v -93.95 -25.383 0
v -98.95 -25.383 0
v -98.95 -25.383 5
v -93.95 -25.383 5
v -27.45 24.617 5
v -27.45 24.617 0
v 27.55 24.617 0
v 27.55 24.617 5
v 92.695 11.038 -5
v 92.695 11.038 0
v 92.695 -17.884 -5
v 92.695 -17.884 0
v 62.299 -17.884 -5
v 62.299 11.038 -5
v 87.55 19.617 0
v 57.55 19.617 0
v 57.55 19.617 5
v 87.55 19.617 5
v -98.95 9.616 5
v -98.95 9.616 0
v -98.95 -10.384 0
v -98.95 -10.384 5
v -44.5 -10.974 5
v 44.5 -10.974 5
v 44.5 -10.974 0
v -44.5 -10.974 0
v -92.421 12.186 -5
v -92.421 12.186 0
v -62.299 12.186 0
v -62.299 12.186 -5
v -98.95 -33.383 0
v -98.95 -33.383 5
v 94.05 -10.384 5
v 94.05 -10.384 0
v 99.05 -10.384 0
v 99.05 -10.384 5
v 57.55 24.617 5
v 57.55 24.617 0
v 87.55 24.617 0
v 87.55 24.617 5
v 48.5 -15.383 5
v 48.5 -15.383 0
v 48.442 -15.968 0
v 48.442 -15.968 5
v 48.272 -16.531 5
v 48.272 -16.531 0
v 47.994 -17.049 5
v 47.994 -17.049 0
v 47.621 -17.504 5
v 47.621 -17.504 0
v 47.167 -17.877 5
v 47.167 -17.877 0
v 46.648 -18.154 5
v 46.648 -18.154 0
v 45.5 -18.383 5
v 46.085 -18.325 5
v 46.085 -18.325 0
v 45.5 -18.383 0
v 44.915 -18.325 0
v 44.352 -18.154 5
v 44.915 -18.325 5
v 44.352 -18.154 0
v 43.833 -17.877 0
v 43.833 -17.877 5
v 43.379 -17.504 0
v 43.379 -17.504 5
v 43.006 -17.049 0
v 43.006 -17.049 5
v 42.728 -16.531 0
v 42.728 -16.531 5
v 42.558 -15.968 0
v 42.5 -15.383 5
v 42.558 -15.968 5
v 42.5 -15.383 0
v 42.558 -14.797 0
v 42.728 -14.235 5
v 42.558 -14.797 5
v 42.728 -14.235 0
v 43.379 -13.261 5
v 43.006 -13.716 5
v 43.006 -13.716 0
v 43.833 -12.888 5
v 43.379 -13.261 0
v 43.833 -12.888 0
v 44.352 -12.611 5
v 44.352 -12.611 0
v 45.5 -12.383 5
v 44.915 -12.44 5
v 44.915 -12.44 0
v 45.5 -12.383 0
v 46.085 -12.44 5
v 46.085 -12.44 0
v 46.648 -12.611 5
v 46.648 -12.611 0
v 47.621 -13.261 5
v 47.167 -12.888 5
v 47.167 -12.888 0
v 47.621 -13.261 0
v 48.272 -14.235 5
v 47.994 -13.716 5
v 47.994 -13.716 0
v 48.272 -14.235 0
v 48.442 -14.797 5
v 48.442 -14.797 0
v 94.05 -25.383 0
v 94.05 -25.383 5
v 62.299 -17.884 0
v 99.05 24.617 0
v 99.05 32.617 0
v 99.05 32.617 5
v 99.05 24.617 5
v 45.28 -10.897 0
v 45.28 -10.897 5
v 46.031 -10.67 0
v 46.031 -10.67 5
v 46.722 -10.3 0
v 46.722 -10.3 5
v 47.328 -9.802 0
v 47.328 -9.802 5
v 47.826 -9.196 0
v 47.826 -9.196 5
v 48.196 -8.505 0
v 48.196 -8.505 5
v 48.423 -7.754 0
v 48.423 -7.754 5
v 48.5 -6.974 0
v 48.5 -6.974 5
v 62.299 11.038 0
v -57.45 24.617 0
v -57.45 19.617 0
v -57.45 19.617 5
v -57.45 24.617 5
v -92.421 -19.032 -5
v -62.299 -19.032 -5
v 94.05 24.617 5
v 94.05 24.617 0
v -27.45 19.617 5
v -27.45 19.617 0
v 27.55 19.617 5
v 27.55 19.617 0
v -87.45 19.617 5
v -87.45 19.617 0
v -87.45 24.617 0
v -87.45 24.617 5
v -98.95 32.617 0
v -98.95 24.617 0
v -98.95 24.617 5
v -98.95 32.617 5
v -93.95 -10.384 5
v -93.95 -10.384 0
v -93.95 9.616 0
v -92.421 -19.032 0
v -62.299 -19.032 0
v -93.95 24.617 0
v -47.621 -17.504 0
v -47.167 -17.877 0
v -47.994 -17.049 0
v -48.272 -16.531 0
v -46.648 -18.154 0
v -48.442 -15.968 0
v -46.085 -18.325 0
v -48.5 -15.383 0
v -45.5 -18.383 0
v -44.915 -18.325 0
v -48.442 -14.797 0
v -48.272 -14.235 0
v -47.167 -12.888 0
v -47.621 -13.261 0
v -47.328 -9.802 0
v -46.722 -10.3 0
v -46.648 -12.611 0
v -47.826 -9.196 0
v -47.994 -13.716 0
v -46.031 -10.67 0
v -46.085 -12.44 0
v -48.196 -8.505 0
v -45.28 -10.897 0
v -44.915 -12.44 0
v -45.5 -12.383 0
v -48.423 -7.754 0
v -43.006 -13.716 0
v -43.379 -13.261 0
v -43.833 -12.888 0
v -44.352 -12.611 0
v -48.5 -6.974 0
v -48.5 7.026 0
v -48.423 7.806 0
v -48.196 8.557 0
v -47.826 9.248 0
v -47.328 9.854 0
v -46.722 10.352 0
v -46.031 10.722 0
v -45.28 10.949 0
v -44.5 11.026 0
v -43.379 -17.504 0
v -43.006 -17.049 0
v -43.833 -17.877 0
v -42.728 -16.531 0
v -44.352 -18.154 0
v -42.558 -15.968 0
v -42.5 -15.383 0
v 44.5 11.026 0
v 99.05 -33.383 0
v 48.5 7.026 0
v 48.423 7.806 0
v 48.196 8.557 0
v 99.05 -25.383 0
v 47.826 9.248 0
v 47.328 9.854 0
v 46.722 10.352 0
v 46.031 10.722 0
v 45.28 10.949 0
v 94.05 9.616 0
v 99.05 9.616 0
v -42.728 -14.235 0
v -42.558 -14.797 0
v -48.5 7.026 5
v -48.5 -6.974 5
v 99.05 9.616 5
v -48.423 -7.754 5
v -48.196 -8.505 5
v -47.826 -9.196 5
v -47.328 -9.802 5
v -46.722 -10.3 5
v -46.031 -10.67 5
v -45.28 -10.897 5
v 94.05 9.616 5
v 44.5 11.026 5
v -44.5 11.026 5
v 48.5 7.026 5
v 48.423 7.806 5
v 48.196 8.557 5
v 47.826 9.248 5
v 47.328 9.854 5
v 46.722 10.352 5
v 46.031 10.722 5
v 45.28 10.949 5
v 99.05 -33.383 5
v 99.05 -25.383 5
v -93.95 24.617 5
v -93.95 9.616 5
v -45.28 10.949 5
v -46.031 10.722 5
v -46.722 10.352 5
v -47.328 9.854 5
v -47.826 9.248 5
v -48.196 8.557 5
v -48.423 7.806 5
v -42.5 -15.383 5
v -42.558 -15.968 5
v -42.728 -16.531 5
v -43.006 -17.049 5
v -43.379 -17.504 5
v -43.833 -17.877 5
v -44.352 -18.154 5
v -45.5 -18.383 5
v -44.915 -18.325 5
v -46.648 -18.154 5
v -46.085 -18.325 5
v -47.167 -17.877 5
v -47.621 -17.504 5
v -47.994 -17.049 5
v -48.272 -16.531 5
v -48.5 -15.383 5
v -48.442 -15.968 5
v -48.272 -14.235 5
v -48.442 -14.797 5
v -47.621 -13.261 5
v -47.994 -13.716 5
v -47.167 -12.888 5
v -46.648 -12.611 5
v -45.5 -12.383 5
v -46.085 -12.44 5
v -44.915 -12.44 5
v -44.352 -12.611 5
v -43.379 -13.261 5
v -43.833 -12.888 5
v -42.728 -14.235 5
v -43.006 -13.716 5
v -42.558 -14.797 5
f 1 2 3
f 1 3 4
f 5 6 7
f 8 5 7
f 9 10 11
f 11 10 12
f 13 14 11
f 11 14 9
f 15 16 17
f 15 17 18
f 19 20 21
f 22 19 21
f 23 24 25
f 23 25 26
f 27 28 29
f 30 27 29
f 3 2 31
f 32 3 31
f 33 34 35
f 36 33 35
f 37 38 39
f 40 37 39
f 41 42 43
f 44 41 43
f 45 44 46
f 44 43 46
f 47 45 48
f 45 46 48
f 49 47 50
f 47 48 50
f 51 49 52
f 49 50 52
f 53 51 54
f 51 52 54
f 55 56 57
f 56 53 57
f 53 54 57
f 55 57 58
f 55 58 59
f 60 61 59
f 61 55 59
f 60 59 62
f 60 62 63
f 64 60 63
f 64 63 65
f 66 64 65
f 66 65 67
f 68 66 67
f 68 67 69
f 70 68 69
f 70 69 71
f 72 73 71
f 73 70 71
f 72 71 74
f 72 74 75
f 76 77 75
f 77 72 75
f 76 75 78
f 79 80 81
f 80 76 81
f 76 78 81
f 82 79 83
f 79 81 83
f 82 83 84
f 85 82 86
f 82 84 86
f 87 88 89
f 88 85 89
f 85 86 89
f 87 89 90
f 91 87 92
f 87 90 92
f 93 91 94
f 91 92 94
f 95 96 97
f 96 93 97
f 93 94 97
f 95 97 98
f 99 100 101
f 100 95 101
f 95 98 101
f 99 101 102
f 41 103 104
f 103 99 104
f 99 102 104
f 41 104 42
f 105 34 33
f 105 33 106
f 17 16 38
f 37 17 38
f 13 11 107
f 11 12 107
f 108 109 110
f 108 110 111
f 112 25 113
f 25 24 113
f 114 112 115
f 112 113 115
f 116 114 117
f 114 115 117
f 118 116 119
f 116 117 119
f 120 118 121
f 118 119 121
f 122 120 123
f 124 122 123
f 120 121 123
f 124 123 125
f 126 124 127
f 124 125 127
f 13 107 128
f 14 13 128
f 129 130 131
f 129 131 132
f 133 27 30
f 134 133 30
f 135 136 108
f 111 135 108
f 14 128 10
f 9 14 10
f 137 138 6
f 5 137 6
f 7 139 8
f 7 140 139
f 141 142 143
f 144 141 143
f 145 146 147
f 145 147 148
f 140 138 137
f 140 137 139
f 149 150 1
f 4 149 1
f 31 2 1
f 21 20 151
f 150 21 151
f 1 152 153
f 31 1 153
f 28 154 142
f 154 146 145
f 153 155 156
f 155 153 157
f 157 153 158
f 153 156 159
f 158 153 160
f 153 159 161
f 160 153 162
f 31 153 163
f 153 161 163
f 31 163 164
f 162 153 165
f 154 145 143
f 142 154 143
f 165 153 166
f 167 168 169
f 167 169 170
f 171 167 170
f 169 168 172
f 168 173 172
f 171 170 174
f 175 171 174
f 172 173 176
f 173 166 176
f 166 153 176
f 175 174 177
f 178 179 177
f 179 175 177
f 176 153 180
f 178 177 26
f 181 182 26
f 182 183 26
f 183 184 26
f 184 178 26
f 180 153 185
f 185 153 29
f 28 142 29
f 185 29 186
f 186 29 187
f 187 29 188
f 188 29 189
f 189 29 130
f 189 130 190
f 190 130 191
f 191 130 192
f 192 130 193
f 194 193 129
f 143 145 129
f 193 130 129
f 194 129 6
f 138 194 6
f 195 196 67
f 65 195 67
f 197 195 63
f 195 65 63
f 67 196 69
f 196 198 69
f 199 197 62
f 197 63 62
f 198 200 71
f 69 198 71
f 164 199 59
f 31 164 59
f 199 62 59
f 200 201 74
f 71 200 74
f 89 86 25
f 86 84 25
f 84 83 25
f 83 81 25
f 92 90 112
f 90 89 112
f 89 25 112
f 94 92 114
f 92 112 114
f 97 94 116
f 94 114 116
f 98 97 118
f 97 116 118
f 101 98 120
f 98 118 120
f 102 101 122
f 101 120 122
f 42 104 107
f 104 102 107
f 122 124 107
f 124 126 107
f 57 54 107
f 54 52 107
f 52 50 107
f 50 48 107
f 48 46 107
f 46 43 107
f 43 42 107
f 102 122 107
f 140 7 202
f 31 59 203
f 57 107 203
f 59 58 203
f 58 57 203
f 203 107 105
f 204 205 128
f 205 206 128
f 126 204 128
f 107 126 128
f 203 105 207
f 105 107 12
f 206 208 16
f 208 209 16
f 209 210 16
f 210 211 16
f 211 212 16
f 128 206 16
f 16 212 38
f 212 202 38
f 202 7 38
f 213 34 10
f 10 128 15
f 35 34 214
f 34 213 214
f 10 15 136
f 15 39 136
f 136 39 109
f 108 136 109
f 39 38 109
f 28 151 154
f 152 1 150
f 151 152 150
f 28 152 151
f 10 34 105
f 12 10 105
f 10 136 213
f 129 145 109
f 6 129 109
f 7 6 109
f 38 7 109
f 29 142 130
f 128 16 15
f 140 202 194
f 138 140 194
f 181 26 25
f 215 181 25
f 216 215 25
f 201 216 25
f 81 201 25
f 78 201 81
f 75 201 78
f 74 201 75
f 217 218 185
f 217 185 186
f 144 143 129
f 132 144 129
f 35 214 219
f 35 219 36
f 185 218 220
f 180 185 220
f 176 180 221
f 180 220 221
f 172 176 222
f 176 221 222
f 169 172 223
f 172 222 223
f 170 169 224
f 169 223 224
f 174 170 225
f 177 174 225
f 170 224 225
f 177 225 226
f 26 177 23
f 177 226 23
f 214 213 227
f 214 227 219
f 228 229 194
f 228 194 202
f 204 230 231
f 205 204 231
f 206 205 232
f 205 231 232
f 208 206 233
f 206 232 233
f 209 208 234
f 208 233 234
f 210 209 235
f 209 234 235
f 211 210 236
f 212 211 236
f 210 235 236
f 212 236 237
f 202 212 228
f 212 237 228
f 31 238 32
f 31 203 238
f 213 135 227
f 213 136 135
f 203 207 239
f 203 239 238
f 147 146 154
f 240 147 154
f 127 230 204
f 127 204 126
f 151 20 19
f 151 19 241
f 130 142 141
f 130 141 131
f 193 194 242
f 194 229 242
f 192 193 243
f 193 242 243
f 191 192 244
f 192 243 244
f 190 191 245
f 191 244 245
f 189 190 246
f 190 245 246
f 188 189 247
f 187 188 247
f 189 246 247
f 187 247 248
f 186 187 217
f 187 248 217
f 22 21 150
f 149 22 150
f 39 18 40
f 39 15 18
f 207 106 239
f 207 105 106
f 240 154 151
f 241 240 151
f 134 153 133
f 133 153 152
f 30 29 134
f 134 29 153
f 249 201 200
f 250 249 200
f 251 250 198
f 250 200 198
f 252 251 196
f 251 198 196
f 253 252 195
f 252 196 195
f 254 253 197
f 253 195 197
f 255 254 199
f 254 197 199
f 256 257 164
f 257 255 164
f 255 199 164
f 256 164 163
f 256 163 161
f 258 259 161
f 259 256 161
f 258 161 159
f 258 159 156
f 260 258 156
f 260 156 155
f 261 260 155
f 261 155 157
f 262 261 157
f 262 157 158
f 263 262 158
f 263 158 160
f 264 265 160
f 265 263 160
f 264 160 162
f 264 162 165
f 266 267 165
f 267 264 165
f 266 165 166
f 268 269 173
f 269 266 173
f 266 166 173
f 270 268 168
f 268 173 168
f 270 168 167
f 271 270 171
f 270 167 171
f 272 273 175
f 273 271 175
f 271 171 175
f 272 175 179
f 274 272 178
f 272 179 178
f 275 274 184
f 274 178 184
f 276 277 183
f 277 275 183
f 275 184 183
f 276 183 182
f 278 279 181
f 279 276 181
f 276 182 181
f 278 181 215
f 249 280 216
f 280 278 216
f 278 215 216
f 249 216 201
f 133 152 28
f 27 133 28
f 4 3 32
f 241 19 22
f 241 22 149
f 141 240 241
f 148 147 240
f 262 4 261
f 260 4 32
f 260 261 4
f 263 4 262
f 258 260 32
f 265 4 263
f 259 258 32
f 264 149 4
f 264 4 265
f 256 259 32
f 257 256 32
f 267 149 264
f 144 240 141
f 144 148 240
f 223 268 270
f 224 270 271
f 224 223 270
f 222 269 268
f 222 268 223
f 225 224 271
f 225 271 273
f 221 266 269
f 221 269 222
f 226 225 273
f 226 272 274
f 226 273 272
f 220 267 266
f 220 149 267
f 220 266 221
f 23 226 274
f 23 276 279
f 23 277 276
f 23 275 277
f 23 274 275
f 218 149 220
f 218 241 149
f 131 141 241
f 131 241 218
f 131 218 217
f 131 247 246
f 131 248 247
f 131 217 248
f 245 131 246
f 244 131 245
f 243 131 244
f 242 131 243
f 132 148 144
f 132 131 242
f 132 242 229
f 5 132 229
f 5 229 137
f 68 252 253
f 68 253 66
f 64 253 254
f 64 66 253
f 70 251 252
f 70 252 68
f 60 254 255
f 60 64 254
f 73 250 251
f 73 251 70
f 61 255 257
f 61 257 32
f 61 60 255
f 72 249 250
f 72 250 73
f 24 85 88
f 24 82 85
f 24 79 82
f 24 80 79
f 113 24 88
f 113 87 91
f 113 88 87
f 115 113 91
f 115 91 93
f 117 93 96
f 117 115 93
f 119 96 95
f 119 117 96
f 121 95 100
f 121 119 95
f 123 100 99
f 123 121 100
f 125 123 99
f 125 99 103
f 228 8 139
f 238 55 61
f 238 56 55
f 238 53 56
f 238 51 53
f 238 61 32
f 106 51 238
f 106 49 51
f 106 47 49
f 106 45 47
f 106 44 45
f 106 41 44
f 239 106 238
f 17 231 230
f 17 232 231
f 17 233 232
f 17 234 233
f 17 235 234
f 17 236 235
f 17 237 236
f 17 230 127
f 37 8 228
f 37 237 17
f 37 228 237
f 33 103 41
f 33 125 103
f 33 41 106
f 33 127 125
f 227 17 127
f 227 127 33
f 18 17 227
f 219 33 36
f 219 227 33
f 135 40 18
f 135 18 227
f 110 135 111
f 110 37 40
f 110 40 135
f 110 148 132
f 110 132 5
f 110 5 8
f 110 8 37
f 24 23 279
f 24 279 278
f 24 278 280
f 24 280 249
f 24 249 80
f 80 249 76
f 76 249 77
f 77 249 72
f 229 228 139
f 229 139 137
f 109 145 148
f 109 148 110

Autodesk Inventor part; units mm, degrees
ref_plane "YZ Plane" through (0, 0, 0) normal (1, 0, 0) x (0, 1, 0)
ref_plane "XZ Plane" through (0, 0, 0) normal (0, 1, 0) x (-1, 0, 0)
ref_plane "XY Plane" through (0, 0, 0) normal (0, 0, 1) x (1, 0, 0)
sketch "Sketch1" plane through (0, 0, 0) normal (0, 0, 1) x (1, 0, 0)
  circle A0 centre (45.5, -15.3826) radius 3
  circle A1 centre (-45.5, -15.3826) radius 3
  line L0 (44.6636, 0.7689) -> (35.6636, 0.7689)
  line L1 (33.6636, 2.7689) -> (33.6636, 5.2689)
  line L2 (46.6636, 5.2689) -> (46.6636, 2.7689)
  line L3 (29.9455, -2.1666) -> (-2.0545, -2.1666)
  line L4 (-4.0545, -0.1666) -> (-4.0545, 2.8334)
  line L5 (31.9455, 2.8334) -> (31.9455, -0.1666)
  circle A2 centre (89.024, -15.4039) radius 1.5
  circle A3 centre (65.024, -15.4039) radius 1.5
  circle A4 centre (89.024, 8.5961) radius 1.5
  circle A5 centre (65.024, 8.5961) radius 1.5
  arc A6 (67.8322, 7.6809) -> (67.8322, -14.4886) centre (77.024, -3.4039) ccw
  line L6 (69.3366, 7.4111) -> (71.8641, 3.0334)
  arc A7 (71.8641, 3.0334) -> (71.8641, -9.8411) centre (77.024, -3.4039) ccw
  line L7 (71.8641, -9.8411) -> (69.3366, -14.2188)
  arc A8 (67.8322, -14.4886) -> (69.3366, -14.2188) centre (68.4705, -13.7188) ccw
  arc A9 (69.3366, 7.4111) -> (67.8322, 7.6809) centre (68.4705, 6.9111) ccw
  arc A10 (91.2195, -0.986) -> (72.0202, 10.0988) centre (77.024, -3.4039) ccw
  arc A11 (72.0202, 10.0988) -> (71.5016, 8.6611) centre (72.3677, 9.1611) ccw
  line L8 (74.0291, 4.2834) -> (71.5016, 8.6611)
  arc A12 (85.1787, -2.1539) -> (74.0291, 4.2834) centre (77.024, -3.4039) ccw
  line L9 (90.2337, -2.1539) -> (85.1787, -2.1539)
  arc A13 (90.2337, -2.1539) -> (91.2195, -0.986) centre (90.2337, -1.1539) ccw
  line L10 (85.1787, -4.6539) -> (90.2337, -4.6539)
  arc A14 (91.2195, -5.8218) -> (90.2337, -4.6539) centre (90.2337, -5.6539) ccw
  arc A15 (72.0202, -16.9065) -> (91.2195, -5.8218) centre (77.024, -3.4039) ccw
  arc A16 (71.5016, -15.4688) -> (72.0202, -16.9065) centre (72.3677, -15.9688) ccw
  line L11 (71.5016, -15.4688) -> (74.0291, -11.0911)
  arc A17 (74.0291, -11.0911) -> (85.1787, -4.6539) centre (77.024, -3.4039) ccw
  circle A18 centre (-64.8953, -15.374) radius 1.5
  circle A19 centre (-88.8953, -15.374) radius 1.5
  circle A20 centre (-88.8953, 8.626) radius 1.5
  circle A21 centre (-64.8953, 8.626) radius 1.5
  arc A22 (-62.6997, -0.956) -> (-81.8991, 10.1287) centre (-76.8953, -3.374) ccw
  arc A23 (-81.8991, 10.1287) -> (-82.4176, 8.691) centre (-81.5516, 9.191) ccw
  line L12 (-79.8901, 4.3133) -> (-82.4176, 8.691)
  line L13 (-84.5827, 7.441) -> (-82.0552, 3.0633)
  arc A24 (-84.5827, 7.441) -> (-86.087, 7.7108) centre (-85.4487, 6.941) ccw
  arc A25 (-86.087, 7.7108) -> (-86.087, -14.4587) centre (-76.8953, -3.374) ccw
  arc A26 (-82.0552, 3.0633) -> (-82.0552, -9.8112) centre (-76.8953, -3.374) ccw
  arc A27 (-68.7405, -2.124) -> (-79.8901, 4.3133) centre (-76.8953, -3.374) ccw
  line L14 (-63.6855, -2.124) -> (-68.7405, -2.124)
  arc A28 (-63.6855, -2.124) -> (-62.6997, -0.956) centre (-63.6855, -1.124) ccw
  line L15 (-68.7405, -4.624) -> (-63.6855, -4.624)
  arc A29 (-62.6997, -5.7919) -> (-63.6855, -4.624) centre (-63.6855, -5.624) ccw
  arc A30 (-81.8991, -16.8766) -> (-62.6997, -5.7919) centre (-76.8953, -3.374) ccw
  arc A31 (-79.8901, -11.0612) -> (-68.7405, -4.624) centre (-76.8953, -3.374) ccw
  line L16 (-82.4176, -15.4389) -> (-79.8901, -11.0612)
  arc A32 (-82.4176, -15.4389) -> (-81.8991, -16.8766) centre (-81.5516, -15.9389) ccw
  line L17 (-82.0552, -9.8112) -> (-84.5827, -14.1889)
  arc A33 (-86.087, -14.4587) -> (-84.5827, -14.1889) centre (-85.4487, -13.6889) ccw
  line L18 (-2.0545, 4.8334) -> (29.9455, 4.8334)
  line L19 (35.6636, 7.2689) -> (44.6636, 7.2689)
  arc A34 (-4.0545, -0.1666) -> (-2.0545, -2.1666) centre (-2.0545, -0.1666) ccw
  arc A35 (-2.0545, 4.8334) -> (-4.0545, 2.8334) centre (-2.0545, 2.8334) ccw
  arc A36 (31.9455, 2.8334) -> (29.9455, 4.8334) centre (29.9455, 2.8334) ccw
  arc A37 (29.9455, -2.1666) -> (31.9455, -0.1666) centre (29.9455, -0.1666) ccw
  arc A38 (33.6636, 2.7689) -> (35.6636, 0.7689) centre (35.6636, 2.7689) ccw
  arc A39 (35.6636, 7.2689) -> (33.6636, 5.2689) centre (35.6636, 5.2689) ccw
  arc A40 (46.6636, 5.2689) -> (44.6636, 7.2689) centre (44.6636, 5.2689) ccw
  arc A41 (44.6636, 0.7689) -> (46.6636, 2.7689) centre (44.6636, 2.7689) ccw
  line L20 (-87.4504, 24.6174) -> (-57.4504, 24.6174)
  line L21 (-87.4504, 19.6174) -> (-87.4504, 24.6174)
  line L22 (-87.4504, 19.6174) -> (-57.4504, 19.6174)
  line L23 (-57.4504, 19.6174) -> (-57.4504, 24.6174)
  line L24 (-27.4504, 19.6174) -> (27.5496, 19.6174)
  line L25 (27.5496, 19.6174) -> (27.5496, 24.6174)
  line L26 (-27.4504, 24.6174) -> (27.5496, 24.6174)
  line L27 (-27.4504, 19.6174) -> (-27.4504, 24.6174)
  line L28 (57.5496, 19.6174) -> (87.5496, 19.6174)
  line L29 (87.5496, 19.6174) -> (87.5496, 24.6174)
  line L30 (57.5496, 24.6174) -> (87.5496, 24.6174)
  line L31 (57.5496, 19.6174) -> (57.5496, 24.6174)
  line L32 (-98.9504, -25.3833) -> (-98.9504, -33.3826)
  line L33 (99.0496, -33.3826) -> (-98.9504, -33.3826)
  line L34 (-98.9504, 24.6174) -> (-93.9504, 24.6174)
  line L35 (-93.9504, 24.6174) -> (-93.9504, 9.6159)
  line L36 (-98.9504, 9.6159) -> (-93.9504, 9.6159)
  line L37 (-98.9504, 9.6159) -> (-98.9504, -10.3841)
  line L38 (-98.9504, -10.3841) -> (-93.9504, -10.3841)
  line L39 (-93.9504, -10.3841) -> (-93.9504, -25.3833)
  line L40 (-98.9504, -25.3833) -> (-93.9504, -25.3833)
  line L41 (99.0496, -25.3833) -> (99.0496, -33.3833)
  line L42 (94.0496, -25.3833) -> (99.0496, -25.3833)
  line L43 (94.0496, -10.3841) -> (94.0496, -25.3833)
  line L44 (94.0496, -10.3841) -> (99.0496, -10.3841)
  line L45 (99.0496, 9.6159) -> (99.0496, -10.3841)
  line L46 (94.0496, 9.6159) -> (99.0496, 9.6159)
  line L47 (94.0496, 24.6174) -> (94.0496, 9.6159)
  line L48 (94.0496, 24.6174) -> (99.0496, 24.6174)
  line L49 (-98.9504, 24.6174) -> (-98.9504, 32.6174)
  line L50 (-98.9504, 32.6174) -> (99.0496, 32.6174)
  line L51 (99.0496, 32.6174) -> (99.0496, 24.6174)
  line L52 (-22.6436, -2.2792) -> (-22.6436, -8.2792)
  line L53 (-35.6436, -0.2792) -> (-24.6436, -0.2792)
  line L54 (-24.6436, -10.2792) -> (-35.6436, -10.2792)
  line L55 (-37.6436, -8.2792) -> (-37.6436, -2.2792)
  arc A42 (-35.6436, -0.2792) -> (-37.6436, -2.2792) centre (-35.6436, -2.2792) ccw
  arc A43 (-22.6436, -2.2792) -> (-24.6436, -0.2792) centre (-24.6436, -2.2792) ccw
  arc A44 (-24.6436, -10.2792) -> (-22.6436, -8.2792) centre (-24.6436, -8.2792) ccw
  arc A45 (-37.6436, -8.2792) -> (-35.6436, -10.2792) centre (-35.6436, -8.2792) ccw
  line L56 (-5.5869, 3.8805) -> (-5.5869, -1.877)
  line L57 (-7.5869, -3.877) -> (-13.5192, -3.877)
  line L58 (-15.5192, -1.877) -> (-15.5192, 3.8805)
  line L59 (-13.5192, 5.8805) -> (-7.5869, 5.8805)
  arc A46 (-13.5192, 5.8805) -> (-15.5192, 3.8805) centre (-13.5192, 3.8805) ccw
  arc A47 (-15.5192, -1.877) -> (-13.5192, -3.877) centre (-13.5192, -1.877) ccw
  arc A48 (-5.5869, 3.8805) -> (-7.5869, 5.8805) centre (-7.5869, 3.8805) ccw
  arc A49 (-7.5869, -3.877) -> (-5.5869, -1.877) centre (-7.5869, -1.877) ccw
  point P0 (-90.9348, -30.6649)
  point P1 (27.5, 24.6174)
  point P2 (0, 0)
  point P3 (-22.6436, -0.2792)
  point P4 (-22.6436, -10.2792)
  point P5 (-37.6436, -0.2792)
  point P6 (-37.6436, -10.2792)
  point P7 (-2.0545, 2.8334)
  dimension "d22" = 91
  dimension "d27" = 7
  dimension "d28" = 36
  dimension "d29" = 13
  dimension "d30" = 6.5
  dimension "d35" = 18
  dimension "d36" = 18
  dimension "d37" = 66
  dimension "d38" = 45.5
  dimension "d39" = 6
  dimension "d40" = 6
  dimension "d41" = 198
extrude "Extrusion1" add sketch "Sketch1" along normal blind 5
sketch "Sketch2" plane through (0, 0, 5) normal (0, 0, 1) x (1, 0, 0)
  line L0 (-44.5, 11.026) -> (44.5, 11.026)
  line L1 (48.5, 7.026) -> (48.5, -6.974)
  line L2 (44.5, -10.974) -> (-44.5, -10.974)
  line L3 (-48.5, -6.974) -> (-48.5, 7.026)
  arc A0 (-44.5, 11.026) -> (-48.5, 7.026) centre (-44.5, 7.026) ccw
  arc A1 (48.5, 7.026) -> (44.5, 11.026) centre (44.5, 7.026) ccw
  arc A2 (44.5, -10.974) -> (48.5, -6.974) centre (44.5, -6.974) ccw
  arc A3 (-48.5, -6.974) -> (-44.5, -10.974) centre (-44.5, -6.974) ccw
  line L4 (99.0496, -10.3841) -> (99.0496, 9.6159) projected
  line L5 (-98.9504, -33.3826) -> (99.0496, -33.3826) projected
  circle A4 centre (-45.5, -15.3826) radius 3 projected
  circle A5 centre (45.5, -15.3826) radius 3 projected
  arc A6 (-62.6997, -0.956) -> (-81.8991, 10.1287) centre (-76.8953, -3.374) ccw projected
  point P0 (0, 0)
  point P1 (-76.8953, -3.374)
  dimension "d48" = 4
  dimension "d58" = 97
  dimension "d59" = 22
  dimension "d60" = 50.5496
  dimension "d61" = 22.4087
extrude "Extrusion2" cut sketch "Sketch2" against normal up to next contours L0 A1 L1 A2 L2 A3 L3 A0
sketch "Sketch3" plane through (0, 0, 5) normal (0, 0, 1) x (1, 0, 0)
  line L0 (-92.421, 12.1859) -> (-62.2986, 12.1859)
  line L1 (-62.2986, 12.1859) -> (-62.2986, -19.0319)
  line L2 (-62.2986, -19.0319) -> (-92.421, -19.0319)
  line L3 (-92.421, -19.0319) -> (-92.421, 12.1859)
  line L4 (-92.421, 12.1859) -> (-62.2986, -19.0319) construction
  line L5 (-62.2986, 12.1859) -> (-92.421, -19.0319) construction
  line L6 (62.2986, 11.0377) -> (92.6949, 11.0377)
  line L7 (92.6949, 11.0377) -> (92.6949, -17.8837)
  line L8 (92.6949, -17.8837) -> (62.2986, -17.8837)
  line L9 (62.2986, -17.8837) -> (62.2986, 11.0377)
  line L10 (62.2986, 11.0377) -> (92.6949, -17.8837) construction
  line L11 (92.6949, 11.0377) -> (62.2986, -17.8837) construction
  point P0 (0, 0)
  point P1 (-77.3598, -3.423)
  point P2 (77.4968, -3.423)
extrude "Extrusion3" add sketch "Sketch3" against normal blind 10
properties part number "case bottom back" material "Titanium"
